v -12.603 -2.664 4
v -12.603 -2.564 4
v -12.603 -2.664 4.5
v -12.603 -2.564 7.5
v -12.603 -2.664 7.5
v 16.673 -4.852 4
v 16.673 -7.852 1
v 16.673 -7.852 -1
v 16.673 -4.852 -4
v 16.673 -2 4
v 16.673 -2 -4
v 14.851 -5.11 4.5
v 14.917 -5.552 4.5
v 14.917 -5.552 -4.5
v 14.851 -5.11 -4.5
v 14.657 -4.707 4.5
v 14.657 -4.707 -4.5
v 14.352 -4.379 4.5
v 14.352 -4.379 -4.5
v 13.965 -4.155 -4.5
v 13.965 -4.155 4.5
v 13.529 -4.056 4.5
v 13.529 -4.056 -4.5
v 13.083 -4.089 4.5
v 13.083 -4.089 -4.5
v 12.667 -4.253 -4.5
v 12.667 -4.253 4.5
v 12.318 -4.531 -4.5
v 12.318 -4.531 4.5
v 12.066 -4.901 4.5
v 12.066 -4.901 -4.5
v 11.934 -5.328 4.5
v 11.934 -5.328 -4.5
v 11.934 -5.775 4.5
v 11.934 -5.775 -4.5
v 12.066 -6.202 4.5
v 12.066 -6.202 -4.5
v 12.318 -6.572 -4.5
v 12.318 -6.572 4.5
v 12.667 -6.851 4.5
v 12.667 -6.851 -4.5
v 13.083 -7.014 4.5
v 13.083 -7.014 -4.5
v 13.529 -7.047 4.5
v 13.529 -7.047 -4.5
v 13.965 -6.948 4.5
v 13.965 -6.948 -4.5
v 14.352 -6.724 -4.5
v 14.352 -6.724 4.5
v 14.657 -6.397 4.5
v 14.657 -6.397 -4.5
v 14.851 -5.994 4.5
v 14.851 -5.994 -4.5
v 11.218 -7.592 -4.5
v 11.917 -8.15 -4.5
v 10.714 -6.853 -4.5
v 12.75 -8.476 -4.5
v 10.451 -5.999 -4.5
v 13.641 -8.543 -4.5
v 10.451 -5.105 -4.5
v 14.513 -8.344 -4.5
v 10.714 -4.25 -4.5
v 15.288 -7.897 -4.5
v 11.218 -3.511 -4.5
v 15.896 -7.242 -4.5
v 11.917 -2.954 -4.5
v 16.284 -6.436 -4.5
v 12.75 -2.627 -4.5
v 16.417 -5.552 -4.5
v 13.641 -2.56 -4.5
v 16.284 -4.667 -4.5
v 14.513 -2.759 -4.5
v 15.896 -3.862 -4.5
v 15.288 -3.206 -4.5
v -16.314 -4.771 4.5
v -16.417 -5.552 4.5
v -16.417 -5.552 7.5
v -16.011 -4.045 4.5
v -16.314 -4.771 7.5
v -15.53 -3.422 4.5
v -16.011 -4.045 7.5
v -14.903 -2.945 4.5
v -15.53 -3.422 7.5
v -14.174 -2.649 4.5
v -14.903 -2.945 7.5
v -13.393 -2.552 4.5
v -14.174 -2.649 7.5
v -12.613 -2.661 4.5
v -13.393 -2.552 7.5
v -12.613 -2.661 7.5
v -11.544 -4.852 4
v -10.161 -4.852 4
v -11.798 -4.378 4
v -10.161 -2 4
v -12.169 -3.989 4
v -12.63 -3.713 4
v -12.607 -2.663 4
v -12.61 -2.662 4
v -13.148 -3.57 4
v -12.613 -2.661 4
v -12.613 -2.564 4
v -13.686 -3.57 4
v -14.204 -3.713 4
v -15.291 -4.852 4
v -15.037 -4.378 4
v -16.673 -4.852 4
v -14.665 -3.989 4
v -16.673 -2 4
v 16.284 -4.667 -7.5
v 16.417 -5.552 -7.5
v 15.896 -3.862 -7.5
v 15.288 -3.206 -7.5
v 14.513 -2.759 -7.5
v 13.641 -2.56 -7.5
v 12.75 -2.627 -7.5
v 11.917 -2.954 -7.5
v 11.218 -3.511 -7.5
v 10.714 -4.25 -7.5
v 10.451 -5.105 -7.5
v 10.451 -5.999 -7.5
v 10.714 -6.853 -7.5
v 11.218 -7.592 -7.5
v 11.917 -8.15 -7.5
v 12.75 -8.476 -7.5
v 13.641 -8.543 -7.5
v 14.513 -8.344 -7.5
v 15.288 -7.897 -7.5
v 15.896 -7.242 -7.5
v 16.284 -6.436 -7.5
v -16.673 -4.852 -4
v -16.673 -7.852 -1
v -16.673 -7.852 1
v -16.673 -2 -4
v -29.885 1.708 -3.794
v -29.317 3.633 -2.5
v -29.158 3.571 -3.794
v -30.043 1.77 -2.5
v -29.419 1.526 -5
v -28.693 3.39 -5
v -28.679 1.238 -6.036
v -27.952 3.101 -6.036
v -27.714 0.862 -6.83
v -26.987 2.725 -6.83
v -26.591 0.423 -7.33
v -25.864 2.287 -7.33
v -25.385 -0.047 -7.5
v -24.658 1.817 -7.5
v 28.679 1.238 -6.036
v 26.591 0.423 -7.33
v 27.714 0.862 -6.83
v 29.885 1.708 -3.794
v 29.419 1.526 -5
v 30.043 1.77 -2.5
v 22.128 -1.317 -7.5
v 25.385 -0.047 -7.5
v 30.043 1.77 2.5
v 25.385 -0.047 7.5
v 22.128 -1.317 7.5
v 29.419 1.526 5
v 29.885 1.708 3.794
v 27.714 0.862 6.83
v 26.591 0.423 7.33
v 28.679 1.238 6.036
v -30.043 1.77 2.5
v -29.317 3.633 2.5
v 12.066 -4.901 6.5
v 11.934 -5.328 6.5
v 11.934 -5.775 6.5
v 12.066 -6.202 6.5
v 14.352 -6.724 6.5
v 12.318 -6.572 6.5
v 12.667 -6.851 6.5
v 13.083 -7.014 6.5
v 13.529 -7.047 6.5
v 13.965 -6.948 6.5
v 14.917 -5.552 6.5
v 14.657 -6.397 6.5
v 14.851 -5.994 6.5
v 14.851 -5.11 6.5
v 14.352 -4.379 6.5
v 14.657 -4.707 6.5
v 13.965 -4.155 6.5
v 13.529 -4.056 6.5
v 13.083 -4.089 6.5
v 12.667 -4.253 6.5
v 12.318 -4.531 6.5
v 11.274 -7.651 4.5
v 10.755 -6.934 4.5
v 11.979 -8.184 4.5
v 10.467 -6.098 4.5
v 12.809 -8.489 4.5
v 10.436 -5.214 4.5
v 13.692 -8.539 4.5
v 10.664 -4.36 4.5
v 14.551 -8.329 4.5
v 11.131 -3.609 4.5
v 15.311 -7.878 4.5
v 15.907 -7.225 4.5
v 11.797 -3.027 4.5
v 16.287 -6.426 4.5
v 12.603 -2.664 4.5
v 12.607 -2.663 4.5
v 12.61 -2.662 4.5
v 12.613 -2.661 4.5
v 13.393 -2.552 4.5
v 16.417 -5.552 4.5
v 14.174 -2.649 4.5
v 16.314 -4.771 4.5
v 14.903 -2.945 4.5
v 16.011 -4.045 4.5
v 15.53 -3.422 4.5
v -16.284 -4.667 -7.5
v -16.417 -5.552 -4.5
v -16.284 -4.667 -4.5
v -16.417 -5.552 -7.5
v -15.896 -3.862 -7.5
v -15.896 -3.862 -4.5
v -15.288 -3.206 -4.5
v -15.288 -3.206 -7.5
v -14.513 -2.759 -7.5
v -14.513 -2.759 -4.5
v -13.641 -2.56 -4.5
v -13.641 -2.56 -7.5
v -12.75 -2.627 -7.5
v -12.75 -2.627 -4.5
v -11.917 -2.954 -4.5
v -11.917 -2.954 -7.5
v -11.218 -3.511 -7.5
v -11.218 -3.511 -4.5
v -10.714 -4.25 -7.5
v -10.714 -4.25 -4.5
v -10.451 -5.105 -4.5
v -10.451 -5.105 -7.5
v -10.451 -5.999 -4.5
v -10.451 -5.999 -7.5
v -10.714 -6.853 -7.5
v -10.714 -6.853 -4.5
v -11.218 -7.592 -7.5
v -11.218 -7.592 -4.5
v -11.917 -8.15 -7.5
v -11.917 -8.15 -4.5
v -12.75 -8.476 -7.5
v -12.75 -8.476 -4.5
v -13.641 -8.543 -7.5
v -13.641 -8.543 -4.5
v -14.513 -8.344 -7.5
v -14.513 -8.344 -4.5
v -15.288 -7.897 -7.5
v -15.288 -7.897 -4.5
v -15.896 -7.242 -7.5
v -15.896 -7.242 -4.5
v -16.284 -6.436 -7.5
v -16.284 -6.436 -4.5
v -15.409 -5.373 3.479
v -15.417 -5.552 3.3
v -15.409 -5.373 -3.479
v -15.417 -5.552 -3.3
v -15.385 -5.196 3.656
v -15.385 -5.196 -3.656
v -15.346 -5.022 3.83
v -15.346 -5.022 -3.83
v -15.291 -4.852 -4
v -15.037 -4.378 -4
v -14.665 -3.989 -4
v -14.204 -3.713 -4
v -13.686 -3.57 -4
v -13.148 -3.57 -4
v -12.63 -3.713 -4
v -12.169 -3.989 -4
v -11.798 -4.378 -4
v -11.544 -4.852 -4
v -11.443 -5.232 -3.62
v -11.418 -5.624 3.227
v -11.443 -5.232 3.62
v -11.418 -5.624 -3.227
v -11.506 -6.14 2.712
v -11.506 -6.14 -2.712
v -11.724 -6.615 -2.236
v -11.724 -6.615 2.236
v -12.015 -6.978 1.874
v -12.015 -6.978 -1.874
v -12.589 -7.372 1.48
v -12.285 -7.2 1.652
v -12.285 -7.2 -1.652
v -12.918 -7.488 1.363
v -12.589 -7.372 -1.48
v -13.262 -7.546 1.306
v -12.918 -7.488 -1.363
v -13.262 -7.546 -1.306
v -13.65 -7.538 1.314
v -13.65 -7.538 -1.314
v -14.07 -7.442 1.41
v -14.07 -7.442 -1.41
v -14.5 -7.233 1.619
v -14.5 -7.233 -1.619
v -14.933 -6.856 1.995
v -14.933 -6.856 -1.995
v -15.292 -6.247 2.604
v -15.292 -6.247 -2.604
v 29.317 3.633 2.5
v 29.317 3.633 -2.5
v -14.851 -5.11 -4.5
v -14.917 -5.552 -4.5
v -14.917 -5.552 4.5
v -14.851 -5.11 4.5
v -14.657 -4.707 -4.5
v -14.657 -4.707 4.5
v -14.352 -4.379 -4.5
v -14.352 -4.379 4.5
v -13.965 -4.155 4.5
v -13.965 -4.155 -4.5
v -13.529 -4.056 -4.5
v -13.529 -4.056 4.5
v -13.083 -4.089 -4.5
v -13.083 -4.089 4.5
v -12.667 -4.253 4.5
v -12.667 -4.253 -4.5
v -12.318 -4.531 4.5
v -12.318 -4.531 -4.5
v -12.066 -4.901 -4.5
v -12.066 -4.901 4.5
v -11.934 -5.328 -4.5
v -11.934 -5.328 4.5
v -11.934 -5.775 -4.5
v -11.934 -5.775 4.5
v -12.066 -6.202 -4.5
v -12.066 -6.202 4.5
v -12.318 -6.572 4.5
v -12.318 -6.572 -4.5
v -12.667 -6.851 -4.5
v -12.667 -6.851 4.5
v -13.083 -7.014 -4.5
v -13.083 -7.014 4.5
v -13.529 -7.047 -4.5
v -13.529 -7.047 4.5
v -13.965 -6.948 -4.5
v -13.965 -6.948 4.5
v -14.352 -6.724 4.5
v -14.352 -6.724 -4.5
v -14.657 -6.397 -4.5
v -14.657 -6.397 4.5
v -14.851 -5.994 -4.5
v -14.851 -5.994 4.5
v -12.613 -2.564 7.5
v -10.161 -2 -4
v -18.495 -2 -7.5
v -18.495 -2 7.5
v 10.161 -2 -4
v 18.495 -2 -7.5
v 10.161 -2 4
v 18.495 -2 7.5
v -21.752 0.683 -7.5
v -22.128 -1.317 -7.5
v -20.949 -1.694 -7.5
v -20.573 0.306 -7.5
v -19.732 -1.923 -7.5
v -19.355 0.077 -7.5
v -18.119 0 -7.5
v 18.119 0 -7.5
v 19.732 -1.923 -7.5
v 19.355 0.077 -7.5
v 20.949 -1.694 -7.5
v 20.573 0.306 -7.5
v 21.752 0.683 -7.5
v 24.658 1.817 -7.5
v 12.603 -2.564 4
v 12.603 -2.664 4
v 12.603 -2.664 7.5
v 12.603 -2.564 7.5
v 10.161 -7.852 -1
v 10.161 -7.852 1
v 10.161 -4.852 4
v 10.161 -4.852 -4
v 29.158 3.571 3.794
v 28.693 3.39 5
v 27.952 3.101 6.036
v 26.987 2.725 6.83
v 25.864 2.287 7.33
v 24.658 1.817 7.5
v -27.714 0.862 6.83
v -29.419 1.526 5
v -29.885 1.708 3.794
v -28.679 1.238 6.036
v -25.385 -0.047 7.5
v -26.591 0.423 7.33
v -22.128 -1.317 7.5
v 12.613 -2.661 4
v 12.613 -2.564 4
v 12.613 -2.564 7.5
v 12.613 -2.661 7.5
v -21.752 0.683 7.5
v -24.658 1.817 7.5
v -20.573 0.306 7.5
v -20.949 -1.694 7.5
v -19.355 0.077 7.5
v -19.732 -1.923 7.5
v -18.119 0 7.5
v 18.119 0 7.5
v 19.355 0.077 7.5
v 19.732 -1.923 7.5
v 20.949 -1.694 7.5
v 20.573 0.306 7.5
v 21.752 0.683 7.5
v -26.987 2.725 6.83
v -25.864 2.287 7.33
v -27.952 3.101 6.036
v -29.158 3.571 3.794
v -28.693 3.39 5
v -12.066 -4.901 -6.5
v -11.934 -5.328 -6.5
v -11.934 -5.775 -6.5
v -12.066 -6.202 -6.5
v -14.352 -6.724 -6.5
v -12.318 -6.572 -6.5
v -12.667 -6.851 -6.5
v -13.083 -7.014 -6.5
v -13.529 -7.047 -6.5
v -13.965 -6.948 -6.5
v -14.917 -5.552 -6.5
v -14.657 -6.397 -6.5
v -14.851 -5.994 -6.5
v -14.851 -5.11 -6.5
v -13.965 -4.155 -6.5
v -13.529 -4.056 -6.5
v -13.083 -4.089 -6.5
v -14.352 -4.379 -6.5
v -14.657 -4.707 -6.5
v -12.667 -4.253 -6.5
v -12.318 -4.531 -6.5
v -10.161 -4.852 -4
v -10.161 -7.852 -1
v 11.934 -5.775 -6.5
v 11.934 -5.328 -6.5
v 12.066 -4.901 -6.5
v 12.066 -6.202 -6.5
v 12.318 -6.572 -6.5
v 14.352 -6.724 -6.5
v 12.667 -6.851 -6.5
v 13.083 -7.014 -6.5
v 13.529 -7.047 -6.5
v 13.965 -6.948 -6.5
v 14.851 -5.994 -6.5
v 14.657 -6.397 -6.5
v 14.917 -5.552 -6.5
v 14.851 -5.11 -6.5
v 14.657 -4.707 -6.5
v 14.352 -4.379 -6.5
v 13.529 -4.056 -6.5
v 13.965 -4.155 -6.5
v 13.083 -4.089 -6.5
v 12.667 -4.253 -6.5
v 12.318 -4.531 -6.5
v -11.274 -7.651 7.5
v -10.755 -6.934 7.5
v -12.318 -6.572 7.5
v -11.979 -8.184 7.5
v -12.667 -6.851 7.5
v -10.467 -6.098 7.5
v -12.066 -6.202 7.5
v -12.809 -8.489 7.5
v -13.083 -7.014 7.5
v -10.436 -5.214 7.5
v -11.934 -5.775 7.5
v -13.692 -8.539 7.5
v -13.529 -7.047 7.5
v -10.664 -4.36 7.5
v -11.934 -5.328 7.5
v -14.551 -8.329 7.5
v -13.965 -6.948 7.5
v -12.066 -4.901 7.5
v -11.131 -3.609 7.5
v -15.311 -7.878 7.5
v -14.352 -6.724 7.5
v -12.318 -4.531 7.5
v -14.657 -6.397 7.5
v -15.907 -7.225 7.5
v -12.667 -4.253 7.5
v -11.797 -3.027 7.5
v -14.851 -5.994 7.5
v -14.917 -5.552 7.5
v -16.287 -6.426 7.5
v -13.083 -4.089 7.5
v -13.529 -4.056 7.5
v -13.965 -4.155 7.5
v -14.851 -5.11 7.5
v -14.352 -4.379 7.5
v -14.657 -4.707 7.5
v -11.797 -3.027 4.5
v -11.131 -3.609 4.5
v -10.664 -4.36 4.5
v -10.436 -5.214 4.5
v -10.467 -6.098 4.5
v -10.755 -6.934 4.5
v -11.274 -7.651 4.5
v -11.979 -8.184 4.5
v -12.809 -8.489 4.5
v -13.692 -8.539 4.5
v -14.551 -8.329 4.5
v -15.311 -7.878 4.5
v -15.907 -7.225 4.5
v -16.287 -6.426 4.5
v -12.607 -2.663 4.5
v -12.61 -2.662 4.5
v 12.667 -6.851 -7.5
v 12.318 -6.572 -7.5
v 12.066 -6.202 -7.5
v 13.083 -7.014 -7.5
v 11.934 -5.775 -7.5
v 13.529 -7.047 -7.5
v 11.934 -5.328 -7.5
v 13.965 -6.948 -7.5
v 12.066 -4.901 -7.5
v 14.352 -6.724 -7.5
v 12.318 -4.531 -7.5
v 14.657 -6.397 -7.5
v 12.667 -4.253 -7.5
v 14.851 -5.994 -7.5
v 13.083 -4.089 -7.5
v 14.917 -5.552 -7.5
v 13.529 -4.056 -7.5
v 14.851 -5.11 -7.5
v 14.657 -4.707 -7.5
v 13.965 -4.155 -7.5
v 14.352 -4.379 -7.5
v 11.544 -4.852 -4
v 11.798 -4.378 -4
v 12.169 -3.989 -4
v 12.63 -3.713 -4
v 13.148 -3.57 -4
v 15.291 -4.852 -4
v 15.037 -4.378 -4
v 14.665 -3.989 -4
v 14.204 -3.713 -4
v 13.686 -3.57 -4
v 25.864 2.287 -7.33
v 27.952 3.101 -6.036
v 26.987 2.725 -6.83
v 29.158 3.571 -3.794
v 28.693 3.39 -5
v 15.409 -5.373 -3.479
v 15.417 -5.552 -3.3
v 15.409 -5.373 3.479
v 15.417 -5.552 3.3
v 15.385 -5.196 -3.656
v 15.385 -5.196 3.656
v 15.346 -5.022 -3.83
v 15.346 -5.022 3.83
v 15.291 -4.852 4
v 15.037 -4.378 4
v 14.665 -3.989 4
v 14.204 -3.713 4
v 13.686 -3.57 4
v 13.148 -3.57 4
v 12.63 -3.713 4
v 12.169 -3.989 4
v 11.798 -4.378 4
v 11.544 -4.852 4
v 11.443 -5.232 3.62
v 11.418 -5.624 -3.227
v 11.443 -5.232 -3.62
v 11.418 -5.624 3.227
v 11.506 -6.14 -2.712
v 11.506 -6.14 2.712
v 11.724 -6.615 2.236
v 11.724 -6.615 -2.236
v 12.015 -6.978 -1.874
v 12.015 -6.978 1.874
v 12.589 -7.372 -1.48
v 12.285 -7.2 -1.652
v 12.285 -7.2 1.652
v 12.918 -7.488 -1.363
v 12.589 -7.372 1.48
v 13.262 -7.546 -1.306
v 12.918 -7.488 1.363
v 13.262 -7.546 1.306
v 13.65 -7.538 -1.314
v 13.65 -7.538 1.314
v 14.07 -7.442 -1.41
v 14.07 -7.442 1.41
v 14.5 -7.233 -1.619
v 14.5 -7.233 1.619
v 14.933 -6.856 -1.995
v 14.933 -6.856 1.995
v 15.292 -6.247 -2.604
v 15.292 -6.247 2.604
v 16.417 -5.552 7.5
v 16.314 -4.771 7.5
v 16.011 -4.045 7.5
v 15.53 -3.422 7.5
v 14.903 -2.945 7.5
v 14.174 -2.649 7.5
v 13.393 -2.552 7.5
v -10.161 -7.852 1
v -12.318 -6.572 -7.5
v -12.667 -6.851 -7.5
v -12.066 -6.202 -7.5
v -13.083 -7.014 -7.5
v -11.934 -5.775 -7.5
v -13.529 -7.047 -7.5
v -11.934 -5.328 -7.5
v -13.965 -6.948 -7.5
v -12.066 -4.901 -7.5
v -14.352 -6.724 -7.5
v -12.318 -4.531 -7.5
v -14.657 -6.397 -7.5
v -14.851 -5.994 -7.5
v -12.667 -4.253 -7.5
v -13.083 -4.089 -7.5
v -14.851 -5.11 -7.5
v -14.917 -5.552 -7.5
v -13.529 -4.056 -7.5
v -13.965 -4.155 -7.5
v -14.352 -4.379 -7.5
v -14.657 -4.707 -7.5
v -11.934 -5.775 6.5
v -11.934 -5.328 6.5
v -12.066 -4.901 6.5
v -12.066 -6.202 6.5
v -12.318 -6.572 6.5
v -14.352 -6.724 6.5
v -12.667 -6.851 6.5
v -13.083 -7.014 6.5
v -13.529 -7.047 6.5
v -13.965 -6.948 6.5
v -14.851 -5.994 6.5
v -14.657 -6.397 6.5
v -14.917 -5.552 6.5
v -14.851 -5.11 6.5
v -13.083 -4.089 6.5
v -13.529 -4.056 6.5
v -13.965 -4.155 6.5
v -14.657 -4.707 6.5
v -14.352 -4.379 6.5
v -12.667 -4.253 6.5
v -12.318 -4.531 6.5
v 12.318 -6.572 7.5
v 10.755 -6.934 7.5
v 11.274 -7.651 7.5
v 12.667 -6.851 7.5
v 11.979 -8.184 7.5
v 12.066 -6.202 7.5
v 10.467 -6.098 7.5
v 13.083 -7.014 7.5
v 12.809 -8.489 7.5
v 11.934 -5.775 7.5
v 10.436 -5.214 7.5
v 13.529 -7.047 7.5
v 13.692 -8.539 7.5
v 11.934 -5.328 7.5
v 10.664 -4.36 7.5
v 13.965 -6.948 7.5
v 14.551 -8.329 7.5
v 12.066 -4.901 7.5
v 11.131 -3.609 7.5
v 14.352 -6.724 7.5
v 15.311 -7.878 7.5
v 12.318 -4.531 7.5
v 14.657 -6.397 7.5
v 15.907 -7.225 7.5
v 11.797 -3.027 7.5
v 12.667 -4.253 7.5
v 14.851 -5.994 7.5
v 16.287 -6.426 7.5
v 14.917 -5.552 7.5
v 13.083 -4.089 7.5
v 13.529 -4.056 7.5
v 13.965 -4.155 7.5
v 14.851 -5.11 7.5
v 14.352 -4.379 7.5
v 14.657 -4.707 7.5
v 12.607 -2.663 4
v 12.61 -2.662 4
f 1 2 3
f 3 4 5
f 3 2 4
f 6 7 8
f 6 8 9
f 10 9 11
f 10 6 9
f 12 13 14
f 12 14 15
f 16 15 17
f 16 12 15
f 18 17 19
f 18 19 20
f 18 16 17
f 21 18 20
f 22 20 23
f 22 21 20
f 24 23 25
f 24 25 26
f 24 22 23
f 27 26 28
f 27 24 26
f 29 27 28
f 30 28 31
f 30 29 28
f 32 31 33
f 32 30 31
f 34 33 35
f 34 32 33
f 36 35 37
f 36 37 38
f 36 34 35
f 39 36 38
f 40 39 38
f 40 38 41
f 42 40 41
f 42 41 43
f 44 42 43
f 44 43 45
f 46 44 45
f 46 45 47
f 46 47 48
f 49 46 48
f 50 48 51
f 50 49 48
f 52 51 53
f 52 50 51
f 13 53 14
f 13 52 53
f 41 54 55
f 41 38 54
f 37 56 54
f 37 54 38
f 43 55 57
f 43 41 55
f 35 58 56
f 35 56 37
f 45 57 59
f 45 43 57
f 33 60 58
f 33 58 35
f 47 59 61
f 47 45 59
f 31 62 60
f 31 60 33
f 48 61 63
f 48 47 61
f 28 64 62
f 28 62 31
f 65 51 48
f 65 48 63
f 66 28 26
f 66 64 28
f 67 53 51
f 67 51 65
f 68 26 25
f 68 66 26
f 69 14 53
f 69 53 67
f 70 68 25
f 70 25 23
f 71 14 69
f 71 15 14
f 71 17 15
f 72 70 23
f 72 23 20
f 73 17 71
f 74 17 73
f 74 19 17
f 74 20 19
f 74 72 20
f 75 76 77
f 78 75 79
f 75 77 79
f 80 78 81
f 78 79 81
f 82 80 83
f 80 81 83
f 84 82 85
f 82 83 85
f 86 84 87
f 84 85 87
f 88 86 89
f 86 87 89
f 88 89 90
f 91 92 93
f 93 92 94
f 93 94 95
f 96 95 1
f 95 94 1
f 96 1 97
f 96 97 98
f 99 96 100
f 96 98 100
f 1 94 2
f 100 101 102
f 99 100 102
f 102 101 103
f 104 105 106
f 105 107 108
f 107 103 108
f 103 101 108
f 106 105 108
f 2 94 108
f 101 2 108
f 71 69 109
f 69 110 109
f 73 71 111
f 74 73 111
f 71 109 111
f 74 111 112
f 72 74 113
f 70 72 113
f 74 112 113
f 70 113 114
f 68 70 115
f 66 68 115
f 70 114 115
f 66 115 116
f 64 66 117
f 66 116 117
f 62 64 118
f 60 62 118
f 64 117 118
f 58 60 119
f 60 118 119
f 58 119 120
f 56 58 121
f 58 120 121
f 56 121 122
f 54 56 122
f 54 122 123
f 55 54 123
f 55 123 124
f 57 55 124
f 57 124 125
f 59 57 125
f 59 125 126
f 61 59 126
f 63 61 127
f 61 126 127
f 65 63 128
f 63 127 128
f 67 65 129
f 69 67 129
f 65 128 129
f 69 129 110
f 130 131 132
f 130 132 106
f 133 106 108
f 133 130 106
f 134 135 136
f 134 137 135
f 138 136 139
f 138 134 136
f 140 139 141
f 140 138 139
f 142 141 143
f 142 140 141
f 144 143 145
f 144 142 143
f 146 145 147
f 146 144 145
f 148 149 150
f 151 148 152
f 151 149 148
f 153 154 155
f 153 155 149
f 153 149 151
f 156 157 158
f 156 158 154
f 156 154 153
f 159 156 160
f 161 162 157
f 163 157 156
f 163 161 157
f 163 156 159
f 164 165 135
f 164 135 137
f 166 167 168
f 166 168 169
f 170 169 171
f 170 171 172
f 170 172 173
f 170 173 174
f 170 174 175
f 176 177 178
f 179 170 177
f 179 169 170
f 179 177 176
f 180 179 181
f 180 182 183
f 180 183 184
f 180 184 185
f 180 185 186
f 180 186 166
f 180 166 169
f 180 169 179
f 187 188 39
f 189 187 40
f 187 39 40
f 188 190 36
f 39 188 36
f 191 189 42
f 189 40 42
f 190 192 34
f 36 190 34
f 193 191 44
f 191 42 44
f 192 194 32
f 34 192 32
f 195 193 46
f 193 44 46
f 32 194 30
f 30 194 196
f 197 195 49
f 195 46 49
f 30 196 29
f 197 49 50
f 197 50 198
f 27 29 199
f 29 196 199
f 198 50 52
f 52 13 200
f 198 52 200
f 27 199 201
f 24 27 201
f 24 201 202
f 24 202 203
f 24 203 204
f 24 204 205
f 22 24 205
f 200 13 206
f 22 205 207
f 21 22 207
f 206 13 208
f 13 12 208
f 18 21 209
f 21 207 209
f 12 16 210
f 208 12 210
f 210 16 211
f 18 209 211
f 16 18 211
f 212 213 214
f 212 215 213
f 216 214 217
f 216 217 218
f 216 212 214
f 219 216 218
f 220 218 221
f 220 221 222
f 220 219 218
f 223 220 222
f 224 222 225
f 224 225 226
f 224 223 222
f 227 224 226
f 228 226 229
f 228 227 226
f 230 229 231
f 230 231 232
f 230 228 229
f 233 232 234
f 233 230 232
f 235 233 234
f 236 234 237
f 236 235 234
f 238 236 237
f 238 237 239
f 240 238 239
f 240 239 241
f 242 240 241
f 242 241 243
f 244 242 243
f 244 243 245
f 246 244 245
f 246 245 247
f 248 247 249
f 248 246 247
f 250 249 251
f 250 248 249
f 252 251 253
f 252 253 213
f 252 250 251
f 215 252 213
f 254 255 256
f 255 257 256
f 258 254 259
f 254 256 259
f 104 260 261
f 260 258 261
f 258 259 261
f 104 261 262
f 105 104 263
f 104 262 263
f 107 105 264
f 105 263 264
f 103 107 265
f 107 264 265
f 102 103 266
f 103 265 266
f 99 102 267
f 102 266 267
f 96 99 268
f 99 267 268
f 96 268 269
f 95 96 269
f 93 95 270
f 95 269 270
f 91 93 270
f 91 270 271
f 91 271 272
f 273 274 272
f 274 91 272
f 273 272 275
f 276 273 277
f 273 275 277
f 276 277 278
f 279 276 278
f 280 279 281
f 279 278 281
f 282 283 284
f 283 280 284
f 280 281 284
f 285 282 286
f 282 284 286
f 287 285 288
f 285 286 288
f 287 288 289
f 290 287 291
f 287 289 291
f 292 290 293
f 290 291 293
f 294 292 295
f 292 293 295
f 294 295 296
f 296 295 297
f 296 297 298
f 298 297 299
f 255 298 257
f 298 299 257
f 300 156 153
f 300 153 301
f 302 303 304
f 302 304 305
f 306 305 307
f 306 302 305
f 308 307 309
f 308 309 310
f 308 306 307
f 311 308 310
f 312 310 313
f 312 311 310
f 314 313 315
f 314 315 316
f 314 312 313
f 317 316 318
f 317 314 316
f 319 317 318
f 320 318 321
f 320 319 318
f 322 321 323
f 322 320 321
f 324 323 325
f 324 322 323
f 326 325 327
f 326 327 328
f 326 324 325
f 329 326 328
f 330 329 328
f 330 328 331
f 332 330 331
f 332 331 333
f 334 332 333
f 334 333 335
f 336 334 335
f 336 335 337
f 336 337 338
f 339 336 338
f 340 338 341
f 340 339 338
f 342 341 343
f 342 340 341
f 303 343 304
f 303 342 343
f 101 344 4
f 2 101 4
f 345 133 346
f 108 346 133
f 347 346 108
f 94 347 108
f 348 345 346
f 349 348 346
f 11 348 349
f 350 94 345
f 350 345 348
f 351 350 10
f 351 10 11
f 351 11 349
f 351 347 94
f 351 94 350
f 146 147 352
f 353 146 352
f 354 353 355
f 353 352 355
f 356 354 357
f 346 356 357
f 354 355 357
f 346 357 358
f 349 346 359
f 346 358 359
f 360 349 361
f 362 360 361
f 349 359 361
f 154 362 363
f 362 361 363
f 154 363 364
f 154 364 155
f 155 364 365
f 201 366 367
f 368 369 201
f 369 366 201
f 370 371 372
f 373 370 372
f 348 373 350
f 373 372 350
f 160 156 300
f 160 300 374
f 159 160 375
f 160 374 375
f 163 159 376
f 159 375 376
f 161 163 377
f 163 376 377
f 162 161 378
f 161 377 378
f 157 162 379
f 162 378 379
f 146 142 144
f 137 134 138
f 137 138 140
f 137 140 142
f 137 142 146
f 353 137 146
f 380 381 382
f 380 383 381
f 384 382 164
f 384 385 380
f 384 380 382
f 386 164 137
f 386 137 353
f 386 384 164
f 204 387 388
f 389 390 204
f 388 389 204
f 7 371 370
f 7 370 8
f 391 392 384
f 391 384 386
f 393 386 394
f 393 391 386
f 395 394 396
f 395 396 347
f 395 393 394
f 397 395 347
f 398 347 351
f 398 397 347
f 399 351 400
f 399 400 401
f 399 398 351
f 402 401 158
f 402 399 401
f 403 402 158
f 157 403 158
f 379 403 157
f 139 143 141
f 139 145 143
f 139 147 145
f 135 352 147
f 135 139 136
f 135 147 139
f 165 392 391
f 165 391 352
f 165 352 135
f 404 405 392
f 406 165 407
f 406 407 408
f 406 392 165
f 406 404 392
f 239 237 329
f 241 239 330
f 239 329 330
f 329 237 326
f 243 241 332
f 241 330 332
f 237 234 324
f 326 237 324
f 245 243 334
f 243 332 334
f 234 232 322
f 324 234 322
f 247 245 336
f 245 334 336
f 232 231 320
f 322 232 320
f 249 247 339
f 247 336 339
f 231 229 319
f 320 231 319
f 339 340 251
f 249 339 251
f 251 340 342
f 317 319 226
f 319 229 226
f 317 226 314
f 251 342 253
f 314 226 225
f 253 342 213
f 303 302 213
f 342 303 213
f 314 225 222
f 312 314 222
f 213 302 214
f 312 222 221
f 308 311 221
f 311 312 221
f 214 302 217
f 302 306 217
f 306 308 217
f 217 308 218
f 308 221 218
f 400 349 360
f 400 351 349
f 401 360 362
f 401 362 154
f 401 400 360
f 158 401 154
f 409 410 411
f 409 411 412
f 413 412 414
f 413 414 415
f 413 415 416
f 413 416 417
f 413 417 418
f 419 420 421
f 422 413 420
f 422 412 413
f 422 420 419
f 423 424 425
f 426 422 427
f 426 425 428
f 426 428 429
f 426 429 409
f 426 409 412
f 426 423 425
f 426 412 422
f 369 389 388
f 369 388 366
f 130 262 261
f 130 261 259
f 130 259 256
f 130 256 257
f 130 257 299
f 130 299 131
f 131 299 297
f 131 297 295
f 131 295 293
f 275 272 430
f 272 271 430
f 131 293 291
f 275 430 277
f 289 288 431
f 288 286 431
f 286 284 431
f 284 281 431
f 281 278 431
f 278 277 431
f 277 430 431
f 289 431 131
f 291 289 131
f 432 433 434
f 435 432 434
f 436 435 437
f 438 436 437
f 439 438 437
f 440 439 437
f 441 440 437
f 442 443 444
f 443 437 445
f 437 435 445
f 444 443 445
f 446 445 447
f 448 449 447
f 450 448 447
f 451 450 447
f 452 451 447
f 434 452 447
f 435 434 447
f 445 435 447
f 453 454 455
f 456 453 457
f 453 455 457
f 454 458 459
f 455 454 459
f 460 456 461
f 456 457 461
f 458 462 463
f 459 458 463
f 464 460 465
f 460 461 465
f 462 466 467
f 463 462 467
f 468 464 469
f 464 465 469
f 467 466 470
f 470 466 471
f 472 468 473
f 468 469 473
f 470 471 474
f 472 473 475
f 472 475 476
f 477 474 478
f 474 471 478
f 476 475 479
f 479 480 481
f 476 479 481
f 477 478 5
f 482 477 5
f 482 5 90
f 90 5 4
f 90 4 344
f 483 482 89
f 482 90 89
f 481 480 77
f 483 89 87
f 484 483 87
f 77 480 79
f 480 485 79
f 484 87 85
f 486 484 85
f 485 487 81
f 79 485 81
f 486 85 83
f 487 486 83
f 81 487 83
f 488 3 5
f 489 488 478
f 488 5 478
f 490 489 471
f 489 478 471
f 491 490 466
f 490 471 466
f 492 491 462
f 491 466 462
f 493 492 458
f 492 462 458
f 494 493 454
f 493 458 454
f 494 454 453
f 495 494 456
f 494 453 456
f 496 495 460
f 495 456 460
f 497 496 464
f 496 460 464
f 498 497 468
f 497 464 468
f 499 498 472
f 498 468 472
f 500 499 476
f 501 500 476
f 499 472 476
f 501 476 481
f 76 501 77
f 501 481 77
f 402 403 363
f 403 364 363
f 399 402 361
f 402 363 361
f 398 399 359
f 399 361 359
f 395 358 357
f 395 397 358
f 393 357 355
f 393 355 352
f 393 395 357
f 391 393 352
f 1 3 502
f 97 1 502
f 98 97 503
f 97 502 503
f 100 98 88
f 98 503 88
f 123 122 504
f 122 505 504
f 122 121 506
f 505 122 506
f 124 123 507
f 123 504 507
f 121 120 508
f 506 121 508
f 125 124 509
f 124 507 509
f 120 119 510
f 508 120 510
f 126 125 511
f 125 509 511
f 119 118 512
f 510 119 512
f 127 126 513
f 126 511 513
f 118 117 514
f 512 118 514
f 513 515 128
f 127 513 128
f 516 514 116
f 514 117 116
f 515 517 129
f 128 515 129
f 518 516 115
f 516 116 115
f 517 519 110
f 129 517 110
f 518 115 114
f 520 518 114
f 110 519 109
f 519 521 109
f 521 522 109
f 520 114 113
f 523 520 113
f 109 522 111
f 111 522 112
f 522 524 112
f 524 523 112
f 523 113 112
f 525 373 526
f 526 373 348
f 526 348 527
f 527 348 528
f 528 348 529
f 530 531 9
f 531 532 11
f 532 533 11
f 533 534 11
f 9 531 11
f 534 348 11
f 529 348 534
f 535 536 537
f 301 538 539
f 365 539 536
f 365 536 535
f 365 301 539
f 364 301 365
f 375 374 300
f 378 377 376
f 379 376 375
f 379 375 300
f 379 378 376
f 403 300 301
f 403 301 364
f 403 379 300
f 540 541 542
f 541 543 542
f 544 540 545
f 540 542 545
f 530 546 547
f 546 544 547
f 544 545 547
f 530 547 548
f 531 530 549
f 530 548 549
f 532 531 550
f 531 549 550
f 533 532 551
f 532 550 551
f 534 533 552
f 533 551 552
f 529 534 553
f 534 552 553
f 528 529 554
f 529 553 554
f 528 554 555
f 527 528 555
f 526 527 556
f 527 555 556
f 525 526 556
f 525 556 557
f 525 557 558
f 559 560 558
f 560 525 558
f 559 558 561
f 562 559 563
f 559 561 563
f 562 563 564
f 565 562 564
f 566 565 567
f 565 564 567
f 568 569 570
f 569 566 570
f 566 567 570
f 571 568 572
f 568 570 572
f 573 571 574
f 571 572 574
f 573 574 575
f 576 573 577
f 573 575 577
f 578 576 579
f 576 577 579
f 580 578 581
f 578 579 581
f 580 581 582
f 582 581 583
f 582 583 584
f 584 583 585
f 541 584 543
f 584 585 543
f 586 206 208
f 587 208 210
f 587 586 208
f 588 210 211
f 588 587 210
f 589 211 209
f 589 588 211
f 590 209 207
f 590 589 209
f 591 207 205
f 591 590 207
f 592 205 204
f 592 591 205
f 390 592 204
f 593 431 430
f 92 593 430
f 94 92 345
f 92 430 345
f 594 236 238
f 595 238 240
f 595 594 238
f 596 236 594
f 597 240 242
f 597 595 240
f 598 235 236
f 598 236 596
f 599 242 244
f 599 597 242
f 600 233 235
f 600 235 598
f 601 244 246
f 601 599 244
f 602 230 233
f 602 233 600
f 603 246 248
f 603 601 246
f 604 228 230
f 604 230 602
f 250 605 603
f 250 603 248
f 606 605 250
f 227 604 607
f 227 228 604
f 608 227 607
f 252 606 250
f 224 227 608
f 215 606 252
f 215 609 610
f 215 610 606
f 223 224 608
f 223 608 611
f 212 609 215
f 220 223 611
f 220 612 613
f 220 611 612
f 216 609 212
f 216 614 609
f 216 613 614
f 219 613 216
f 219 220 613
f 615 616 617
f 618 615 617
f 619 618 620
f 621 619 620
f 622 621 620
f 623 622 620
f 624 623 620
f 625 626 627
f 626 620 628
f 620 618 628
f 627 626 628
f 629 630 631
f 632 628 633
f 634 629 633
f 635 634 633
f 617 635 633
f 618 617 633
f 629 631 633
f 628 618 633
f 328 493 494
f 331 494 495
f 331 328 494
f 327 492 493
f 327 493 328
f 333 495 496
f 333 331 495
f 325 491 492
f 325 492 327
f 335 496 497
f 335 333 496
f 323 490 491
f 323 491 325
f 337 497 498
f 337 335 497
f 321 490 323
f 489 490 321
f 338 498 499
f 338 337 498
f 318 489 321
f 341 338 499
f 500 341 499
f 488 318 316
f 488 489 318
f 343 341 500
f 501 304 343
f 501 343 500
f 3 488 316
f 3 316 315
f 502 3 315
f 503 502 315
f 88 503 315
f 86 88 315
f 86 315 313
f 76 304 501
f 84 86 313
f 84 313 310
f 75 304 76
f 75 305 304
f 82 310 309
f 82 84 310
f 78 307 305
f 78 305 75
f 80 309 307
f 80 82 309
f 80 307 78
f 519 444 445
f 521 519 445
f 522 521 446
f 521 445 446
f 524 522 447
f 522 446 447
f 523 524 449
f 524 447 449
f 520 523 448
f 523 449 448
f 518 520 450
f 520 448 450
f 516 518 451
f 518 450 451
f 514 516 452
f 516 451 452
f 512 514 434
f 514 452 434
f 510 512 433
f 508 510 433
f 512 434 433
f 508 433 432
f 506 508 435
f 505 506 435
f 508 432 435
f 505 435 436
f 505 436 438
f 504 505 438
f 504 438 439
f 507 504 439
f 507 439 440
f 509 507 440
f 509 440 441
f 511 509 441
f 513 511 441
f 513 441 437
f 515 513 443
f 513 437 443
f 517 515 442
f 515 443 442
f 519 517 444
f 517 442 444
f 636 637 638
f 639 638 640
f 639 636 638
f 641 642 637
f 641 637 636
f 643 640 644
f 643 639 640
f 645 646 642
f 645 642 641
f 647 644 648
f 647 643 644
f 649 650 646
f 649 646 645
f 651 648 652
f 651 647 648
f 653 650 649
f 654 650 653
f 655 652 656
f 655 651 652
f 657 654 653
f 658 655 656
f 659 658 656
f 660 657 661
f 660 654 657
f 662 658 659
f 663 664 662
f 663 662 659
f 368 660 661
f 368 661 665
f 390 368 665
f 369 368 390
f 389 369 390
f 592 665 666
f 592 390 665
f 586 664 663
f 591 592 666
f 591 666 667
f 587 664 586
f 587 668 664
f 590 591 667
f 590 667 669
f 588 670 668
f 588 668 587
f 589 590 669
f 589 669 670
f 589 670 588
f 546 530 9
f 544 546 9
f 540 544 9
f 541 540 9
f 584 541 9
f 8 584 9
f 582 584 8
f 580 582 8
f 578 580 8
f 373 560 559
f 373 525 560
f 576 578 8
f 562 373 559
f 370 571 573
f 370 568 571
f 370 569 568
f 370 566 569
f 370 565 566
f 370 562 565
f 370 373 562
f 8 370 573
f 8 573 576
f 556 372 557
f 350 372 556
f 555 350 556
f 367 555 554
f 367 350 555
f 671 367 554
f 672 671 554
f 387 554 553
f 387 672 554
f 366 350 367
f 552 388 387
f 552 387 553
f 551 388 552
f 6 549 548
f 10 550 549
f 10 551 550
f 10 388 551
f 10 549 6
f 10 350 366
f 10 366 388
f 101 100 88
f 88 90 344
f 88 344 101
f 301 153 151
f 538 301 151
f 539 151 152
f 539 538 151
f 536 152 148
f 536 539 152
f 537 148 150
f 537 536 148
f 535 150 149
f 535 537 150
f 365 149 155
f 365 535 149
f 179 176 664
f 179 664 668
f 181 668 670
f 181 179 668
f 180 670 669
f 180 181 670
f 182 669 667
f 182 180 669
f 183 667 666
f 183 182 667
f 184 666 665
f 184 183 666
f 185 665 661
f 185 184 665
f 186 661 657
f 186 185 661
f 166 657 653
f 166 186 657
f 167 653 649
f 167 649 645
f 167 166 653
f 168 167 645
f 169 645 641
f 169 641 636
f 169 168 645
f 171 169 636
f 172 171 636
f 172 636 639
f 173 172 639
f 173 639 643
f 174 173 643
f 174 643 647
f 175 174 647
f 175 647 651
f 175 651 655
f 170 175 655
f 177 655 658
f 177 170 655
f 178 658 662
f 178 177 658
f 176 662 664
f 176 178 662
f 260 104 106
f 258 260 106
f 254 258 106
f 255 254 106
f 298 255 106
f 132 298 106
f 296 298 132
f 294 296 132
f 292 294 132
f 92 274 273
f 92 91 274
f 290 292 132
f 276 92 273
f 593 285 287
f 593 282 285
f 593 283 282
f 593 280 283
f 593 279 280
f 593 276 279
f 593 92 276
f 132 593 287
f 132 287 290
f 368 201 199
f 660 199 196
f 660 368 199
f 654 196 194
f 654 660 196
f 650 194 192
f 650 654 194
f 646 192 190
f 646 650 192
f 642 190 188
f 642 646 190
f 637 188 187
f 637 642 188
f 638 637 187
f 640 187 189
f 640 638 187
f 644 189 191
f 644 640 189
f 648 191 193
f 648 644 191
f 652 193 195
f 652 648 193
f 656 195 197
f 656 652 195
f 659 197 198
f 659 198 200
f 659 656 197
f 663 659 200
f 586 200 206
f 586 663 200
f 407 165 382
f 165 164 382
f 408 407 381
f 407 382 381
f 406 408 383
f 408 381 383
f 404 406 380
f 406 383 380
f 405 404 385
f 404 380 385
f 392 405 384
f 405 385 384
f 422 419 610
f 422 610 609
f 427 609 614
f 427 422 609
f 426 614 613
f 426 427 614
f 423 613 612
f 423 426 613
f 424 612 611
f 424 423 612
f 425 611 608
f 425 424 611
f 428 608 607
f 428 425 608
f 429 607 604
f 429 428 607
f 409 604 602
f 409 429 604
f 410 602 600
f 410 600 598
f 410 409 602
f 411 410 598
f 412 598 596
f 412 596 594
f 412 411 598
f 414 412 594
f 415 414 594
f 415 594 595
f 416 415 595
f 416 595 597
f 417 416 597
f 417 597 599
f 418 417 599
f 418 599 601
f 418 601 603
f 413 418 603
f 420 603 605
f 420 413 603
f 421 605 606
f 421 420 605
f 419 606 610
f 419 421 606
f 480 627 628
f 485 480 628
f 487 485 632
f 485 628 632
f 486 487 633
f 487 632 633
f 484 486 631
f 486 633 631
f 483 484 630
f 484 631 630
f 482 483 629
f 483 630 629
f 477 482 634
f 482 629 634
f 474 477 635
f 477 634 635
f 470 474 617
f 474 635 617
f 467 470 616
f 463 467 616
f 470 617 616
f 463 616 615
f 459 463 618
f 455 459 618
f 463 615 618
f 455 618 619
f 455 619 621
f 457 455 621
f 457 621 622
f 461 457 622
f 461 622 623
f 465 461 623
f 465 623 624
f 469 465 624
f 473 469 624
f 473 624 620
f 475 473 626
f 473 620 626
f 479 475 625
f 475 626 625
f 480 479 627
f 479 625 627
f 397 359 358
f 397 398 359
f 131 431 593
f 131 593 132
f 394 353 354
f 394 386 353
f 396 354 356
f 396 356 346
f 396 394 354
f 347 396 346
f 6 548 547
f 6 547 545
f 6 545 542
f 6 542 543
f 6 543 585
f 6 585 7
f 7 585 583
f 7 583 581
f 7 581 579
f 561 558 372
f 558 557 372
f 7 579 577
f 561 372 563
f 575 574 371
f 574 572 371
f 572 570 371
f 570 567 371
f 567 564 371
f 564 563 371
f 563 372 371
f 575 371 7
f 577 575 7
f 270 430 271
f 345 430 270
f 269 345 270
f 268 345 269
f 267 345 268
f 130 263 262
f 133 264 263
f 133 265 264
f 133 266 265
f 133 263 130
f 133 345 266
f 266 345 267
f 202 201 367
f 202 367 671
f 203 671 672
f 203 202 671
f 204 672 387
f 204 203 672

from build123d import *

# Parameters (mm, degrees)
F1_DEPTH    = 7.5
F2_R        = 5
F3_R        = 10
F4_W        = 6.5123213332
F4_H        = 5.8516720749
F4_R        = 2
F5_DEPTH    = 4
F4_R_2      = 1.5
F6_DEPTH    = 6.5
F7_T1_DEPTH = 21.942419261
F8_R        = 3
F8_R_2      = 1.5
F9_DEPTH    = 1
F10_DEPTH   = 1
F14_DEPTH   = 5


# Not quite as in the source:
# - a fillet or chamfer that OpenCascade refuses, or shapes differently, is made with other operations: its cross-section is extruded or revolved along the edge and cut away or added


with BuildPart() as f1:
    # F0 (on Top) → F1 (new body, symmetric)
    with BuildSketch(Plane.XY):
        Polygon((20, 0), (0, 0), (-20, 0), (-29.3166648167, 3.6331469407), (-30.0432942049, 1.7698139773), (-20.3761671049, -2), (0, -2), (20.3761671049, -2), (30.0432942049, 1.7698139773), (29.3166648167, 3.6331469407), align=None)
    extrude(amount=F1_DEPTH, both=True)

    # F2
    f2_edges = [f1.edges().sort_by_distance(p)[0] for p in [
        (29.67998, 2.70148, 7.5),
        (29.67998, 2.70148, -7.5),
        (-29.67998, 2.70148, 7.5),
        (-29.67998, 2.70148, -7.5),
    ]]
    fillet(f2_edges, radius=F2_R)

    # F3
    f3_edges = [f1.edges().sort_by_distance(p)[0] for p in [
        (20, 0, 0),
        (-20, 0, 0),
        (-20.376167, -2, 0),
        (20.376167, -2, 0),
    ]]
    fillet(f3_edges, radius=F3_R)

    # F4 (on Top) → F5 (join)
    with BuildSketch(Plane.XY):
        with Locations((13.4171620011, -4.9258360375)):
            Rectangle(F4_W, F4_H)
        with Locations((13.4171620011, -5.5516720749)):
            Circle(F4_R, mode=Mode.SUBTRACT)
    extrude(amount=F5_DEPTH)

    # F7: chamfer of 3 on 1 edges, made by hand

    # F7_s2 → F7_t1 (cut)
    with BuildSketch(Plane.YZ.offset(2.4459523706)):
        Polygon((-4.8516720749, 4), (-7.8516720749, 1), (-7.8516720749, 4), align=None)
    extrude(amount=F7_T1_DEPTH, mode=Mode.SUBTRACT)


with BuildPart() as f6:
    # F4 (on Top) → F6 (new body, symmetric)
    with BuildSketch(Plane.XY):
        with Locations((13.4171620011, -5.5516720749)):
            Circle(F4_R_2)
    extrude(amount=F6_DEPTH, both=True)

    # F8 (on face) → F9 (join, symmetric)
    with BuildSketch(Plane.XY.offset(6.5)):
        with Locations((13.4171620011, -5.5516720749)):
            Circle(F8_R)
        with Locations((13.4171620011, -5.5516720749)):
            Circle(F8_R_2, mode=Mode.SUBTRACT)
    extrude(amount=F9_DEPTH, both=True)

    # F10 (add): a face of the model
    f10_faces = [f6.faces().sort_by_distance(p)[0] for p in [
        (10.5020148149, -5.5516720749, 5.5),
    ]]
    extrude(f10_faces, amount=F10_DEPTH)


with BuildPart() as f11_1:
    # F11: instance of F1
    add(f1.part.mirror(Plane.XY))


with BuildPart() as f11_2:
    # F11: instance of F6
    add(f6.part.mirror(Plane.XY))


with BuildPart() as f1_1:
    add(f1.part)

    add(f11_1.part)  # F12 merges F11_1
    # F12: F11_2, F11_1, F6, F1 across plane
    add(f11_2.part.mirror(Plane.YZ))
    add(f11_1.part.mirror(Plane.YZ))
    add(f6.part.mirror(Plane.YZ))
    add(f1.part.mirror(Plane.YZ))

    add(f6.part)  # F14 merges F6
    # F13 (on face) → F14 (join)
    with BuildSketch(Plane.XY.offset(7.5)):
        with BuildLine():
            Line((12.6132123219, -2.5642015695), (12.6032123219, -2.5642015695))
            Line((12.6032123219, -2.5642015695), (12.6032123219, -2.6642015695))
            ThreePointArc((12.6032123219, -2.6642015695), (12.6082111102, -2.6627971285), (12.6132123219, -2.6614013414))
            Line((12.6132123219, -2.6614013414), (12.6132123219, -2.5642015695))
        make_face()
    extrude(amount=-F14_DEPTH)



with BuildPart() as f1_2:
    add(f1_1.part)

    add(f11_2.part)  # F15 merges F11_2
    # F15: F1 across plane
    add(f1_1.part.mirror(Plane.YZ))

    # F16: union 


solid = f1_2.part
